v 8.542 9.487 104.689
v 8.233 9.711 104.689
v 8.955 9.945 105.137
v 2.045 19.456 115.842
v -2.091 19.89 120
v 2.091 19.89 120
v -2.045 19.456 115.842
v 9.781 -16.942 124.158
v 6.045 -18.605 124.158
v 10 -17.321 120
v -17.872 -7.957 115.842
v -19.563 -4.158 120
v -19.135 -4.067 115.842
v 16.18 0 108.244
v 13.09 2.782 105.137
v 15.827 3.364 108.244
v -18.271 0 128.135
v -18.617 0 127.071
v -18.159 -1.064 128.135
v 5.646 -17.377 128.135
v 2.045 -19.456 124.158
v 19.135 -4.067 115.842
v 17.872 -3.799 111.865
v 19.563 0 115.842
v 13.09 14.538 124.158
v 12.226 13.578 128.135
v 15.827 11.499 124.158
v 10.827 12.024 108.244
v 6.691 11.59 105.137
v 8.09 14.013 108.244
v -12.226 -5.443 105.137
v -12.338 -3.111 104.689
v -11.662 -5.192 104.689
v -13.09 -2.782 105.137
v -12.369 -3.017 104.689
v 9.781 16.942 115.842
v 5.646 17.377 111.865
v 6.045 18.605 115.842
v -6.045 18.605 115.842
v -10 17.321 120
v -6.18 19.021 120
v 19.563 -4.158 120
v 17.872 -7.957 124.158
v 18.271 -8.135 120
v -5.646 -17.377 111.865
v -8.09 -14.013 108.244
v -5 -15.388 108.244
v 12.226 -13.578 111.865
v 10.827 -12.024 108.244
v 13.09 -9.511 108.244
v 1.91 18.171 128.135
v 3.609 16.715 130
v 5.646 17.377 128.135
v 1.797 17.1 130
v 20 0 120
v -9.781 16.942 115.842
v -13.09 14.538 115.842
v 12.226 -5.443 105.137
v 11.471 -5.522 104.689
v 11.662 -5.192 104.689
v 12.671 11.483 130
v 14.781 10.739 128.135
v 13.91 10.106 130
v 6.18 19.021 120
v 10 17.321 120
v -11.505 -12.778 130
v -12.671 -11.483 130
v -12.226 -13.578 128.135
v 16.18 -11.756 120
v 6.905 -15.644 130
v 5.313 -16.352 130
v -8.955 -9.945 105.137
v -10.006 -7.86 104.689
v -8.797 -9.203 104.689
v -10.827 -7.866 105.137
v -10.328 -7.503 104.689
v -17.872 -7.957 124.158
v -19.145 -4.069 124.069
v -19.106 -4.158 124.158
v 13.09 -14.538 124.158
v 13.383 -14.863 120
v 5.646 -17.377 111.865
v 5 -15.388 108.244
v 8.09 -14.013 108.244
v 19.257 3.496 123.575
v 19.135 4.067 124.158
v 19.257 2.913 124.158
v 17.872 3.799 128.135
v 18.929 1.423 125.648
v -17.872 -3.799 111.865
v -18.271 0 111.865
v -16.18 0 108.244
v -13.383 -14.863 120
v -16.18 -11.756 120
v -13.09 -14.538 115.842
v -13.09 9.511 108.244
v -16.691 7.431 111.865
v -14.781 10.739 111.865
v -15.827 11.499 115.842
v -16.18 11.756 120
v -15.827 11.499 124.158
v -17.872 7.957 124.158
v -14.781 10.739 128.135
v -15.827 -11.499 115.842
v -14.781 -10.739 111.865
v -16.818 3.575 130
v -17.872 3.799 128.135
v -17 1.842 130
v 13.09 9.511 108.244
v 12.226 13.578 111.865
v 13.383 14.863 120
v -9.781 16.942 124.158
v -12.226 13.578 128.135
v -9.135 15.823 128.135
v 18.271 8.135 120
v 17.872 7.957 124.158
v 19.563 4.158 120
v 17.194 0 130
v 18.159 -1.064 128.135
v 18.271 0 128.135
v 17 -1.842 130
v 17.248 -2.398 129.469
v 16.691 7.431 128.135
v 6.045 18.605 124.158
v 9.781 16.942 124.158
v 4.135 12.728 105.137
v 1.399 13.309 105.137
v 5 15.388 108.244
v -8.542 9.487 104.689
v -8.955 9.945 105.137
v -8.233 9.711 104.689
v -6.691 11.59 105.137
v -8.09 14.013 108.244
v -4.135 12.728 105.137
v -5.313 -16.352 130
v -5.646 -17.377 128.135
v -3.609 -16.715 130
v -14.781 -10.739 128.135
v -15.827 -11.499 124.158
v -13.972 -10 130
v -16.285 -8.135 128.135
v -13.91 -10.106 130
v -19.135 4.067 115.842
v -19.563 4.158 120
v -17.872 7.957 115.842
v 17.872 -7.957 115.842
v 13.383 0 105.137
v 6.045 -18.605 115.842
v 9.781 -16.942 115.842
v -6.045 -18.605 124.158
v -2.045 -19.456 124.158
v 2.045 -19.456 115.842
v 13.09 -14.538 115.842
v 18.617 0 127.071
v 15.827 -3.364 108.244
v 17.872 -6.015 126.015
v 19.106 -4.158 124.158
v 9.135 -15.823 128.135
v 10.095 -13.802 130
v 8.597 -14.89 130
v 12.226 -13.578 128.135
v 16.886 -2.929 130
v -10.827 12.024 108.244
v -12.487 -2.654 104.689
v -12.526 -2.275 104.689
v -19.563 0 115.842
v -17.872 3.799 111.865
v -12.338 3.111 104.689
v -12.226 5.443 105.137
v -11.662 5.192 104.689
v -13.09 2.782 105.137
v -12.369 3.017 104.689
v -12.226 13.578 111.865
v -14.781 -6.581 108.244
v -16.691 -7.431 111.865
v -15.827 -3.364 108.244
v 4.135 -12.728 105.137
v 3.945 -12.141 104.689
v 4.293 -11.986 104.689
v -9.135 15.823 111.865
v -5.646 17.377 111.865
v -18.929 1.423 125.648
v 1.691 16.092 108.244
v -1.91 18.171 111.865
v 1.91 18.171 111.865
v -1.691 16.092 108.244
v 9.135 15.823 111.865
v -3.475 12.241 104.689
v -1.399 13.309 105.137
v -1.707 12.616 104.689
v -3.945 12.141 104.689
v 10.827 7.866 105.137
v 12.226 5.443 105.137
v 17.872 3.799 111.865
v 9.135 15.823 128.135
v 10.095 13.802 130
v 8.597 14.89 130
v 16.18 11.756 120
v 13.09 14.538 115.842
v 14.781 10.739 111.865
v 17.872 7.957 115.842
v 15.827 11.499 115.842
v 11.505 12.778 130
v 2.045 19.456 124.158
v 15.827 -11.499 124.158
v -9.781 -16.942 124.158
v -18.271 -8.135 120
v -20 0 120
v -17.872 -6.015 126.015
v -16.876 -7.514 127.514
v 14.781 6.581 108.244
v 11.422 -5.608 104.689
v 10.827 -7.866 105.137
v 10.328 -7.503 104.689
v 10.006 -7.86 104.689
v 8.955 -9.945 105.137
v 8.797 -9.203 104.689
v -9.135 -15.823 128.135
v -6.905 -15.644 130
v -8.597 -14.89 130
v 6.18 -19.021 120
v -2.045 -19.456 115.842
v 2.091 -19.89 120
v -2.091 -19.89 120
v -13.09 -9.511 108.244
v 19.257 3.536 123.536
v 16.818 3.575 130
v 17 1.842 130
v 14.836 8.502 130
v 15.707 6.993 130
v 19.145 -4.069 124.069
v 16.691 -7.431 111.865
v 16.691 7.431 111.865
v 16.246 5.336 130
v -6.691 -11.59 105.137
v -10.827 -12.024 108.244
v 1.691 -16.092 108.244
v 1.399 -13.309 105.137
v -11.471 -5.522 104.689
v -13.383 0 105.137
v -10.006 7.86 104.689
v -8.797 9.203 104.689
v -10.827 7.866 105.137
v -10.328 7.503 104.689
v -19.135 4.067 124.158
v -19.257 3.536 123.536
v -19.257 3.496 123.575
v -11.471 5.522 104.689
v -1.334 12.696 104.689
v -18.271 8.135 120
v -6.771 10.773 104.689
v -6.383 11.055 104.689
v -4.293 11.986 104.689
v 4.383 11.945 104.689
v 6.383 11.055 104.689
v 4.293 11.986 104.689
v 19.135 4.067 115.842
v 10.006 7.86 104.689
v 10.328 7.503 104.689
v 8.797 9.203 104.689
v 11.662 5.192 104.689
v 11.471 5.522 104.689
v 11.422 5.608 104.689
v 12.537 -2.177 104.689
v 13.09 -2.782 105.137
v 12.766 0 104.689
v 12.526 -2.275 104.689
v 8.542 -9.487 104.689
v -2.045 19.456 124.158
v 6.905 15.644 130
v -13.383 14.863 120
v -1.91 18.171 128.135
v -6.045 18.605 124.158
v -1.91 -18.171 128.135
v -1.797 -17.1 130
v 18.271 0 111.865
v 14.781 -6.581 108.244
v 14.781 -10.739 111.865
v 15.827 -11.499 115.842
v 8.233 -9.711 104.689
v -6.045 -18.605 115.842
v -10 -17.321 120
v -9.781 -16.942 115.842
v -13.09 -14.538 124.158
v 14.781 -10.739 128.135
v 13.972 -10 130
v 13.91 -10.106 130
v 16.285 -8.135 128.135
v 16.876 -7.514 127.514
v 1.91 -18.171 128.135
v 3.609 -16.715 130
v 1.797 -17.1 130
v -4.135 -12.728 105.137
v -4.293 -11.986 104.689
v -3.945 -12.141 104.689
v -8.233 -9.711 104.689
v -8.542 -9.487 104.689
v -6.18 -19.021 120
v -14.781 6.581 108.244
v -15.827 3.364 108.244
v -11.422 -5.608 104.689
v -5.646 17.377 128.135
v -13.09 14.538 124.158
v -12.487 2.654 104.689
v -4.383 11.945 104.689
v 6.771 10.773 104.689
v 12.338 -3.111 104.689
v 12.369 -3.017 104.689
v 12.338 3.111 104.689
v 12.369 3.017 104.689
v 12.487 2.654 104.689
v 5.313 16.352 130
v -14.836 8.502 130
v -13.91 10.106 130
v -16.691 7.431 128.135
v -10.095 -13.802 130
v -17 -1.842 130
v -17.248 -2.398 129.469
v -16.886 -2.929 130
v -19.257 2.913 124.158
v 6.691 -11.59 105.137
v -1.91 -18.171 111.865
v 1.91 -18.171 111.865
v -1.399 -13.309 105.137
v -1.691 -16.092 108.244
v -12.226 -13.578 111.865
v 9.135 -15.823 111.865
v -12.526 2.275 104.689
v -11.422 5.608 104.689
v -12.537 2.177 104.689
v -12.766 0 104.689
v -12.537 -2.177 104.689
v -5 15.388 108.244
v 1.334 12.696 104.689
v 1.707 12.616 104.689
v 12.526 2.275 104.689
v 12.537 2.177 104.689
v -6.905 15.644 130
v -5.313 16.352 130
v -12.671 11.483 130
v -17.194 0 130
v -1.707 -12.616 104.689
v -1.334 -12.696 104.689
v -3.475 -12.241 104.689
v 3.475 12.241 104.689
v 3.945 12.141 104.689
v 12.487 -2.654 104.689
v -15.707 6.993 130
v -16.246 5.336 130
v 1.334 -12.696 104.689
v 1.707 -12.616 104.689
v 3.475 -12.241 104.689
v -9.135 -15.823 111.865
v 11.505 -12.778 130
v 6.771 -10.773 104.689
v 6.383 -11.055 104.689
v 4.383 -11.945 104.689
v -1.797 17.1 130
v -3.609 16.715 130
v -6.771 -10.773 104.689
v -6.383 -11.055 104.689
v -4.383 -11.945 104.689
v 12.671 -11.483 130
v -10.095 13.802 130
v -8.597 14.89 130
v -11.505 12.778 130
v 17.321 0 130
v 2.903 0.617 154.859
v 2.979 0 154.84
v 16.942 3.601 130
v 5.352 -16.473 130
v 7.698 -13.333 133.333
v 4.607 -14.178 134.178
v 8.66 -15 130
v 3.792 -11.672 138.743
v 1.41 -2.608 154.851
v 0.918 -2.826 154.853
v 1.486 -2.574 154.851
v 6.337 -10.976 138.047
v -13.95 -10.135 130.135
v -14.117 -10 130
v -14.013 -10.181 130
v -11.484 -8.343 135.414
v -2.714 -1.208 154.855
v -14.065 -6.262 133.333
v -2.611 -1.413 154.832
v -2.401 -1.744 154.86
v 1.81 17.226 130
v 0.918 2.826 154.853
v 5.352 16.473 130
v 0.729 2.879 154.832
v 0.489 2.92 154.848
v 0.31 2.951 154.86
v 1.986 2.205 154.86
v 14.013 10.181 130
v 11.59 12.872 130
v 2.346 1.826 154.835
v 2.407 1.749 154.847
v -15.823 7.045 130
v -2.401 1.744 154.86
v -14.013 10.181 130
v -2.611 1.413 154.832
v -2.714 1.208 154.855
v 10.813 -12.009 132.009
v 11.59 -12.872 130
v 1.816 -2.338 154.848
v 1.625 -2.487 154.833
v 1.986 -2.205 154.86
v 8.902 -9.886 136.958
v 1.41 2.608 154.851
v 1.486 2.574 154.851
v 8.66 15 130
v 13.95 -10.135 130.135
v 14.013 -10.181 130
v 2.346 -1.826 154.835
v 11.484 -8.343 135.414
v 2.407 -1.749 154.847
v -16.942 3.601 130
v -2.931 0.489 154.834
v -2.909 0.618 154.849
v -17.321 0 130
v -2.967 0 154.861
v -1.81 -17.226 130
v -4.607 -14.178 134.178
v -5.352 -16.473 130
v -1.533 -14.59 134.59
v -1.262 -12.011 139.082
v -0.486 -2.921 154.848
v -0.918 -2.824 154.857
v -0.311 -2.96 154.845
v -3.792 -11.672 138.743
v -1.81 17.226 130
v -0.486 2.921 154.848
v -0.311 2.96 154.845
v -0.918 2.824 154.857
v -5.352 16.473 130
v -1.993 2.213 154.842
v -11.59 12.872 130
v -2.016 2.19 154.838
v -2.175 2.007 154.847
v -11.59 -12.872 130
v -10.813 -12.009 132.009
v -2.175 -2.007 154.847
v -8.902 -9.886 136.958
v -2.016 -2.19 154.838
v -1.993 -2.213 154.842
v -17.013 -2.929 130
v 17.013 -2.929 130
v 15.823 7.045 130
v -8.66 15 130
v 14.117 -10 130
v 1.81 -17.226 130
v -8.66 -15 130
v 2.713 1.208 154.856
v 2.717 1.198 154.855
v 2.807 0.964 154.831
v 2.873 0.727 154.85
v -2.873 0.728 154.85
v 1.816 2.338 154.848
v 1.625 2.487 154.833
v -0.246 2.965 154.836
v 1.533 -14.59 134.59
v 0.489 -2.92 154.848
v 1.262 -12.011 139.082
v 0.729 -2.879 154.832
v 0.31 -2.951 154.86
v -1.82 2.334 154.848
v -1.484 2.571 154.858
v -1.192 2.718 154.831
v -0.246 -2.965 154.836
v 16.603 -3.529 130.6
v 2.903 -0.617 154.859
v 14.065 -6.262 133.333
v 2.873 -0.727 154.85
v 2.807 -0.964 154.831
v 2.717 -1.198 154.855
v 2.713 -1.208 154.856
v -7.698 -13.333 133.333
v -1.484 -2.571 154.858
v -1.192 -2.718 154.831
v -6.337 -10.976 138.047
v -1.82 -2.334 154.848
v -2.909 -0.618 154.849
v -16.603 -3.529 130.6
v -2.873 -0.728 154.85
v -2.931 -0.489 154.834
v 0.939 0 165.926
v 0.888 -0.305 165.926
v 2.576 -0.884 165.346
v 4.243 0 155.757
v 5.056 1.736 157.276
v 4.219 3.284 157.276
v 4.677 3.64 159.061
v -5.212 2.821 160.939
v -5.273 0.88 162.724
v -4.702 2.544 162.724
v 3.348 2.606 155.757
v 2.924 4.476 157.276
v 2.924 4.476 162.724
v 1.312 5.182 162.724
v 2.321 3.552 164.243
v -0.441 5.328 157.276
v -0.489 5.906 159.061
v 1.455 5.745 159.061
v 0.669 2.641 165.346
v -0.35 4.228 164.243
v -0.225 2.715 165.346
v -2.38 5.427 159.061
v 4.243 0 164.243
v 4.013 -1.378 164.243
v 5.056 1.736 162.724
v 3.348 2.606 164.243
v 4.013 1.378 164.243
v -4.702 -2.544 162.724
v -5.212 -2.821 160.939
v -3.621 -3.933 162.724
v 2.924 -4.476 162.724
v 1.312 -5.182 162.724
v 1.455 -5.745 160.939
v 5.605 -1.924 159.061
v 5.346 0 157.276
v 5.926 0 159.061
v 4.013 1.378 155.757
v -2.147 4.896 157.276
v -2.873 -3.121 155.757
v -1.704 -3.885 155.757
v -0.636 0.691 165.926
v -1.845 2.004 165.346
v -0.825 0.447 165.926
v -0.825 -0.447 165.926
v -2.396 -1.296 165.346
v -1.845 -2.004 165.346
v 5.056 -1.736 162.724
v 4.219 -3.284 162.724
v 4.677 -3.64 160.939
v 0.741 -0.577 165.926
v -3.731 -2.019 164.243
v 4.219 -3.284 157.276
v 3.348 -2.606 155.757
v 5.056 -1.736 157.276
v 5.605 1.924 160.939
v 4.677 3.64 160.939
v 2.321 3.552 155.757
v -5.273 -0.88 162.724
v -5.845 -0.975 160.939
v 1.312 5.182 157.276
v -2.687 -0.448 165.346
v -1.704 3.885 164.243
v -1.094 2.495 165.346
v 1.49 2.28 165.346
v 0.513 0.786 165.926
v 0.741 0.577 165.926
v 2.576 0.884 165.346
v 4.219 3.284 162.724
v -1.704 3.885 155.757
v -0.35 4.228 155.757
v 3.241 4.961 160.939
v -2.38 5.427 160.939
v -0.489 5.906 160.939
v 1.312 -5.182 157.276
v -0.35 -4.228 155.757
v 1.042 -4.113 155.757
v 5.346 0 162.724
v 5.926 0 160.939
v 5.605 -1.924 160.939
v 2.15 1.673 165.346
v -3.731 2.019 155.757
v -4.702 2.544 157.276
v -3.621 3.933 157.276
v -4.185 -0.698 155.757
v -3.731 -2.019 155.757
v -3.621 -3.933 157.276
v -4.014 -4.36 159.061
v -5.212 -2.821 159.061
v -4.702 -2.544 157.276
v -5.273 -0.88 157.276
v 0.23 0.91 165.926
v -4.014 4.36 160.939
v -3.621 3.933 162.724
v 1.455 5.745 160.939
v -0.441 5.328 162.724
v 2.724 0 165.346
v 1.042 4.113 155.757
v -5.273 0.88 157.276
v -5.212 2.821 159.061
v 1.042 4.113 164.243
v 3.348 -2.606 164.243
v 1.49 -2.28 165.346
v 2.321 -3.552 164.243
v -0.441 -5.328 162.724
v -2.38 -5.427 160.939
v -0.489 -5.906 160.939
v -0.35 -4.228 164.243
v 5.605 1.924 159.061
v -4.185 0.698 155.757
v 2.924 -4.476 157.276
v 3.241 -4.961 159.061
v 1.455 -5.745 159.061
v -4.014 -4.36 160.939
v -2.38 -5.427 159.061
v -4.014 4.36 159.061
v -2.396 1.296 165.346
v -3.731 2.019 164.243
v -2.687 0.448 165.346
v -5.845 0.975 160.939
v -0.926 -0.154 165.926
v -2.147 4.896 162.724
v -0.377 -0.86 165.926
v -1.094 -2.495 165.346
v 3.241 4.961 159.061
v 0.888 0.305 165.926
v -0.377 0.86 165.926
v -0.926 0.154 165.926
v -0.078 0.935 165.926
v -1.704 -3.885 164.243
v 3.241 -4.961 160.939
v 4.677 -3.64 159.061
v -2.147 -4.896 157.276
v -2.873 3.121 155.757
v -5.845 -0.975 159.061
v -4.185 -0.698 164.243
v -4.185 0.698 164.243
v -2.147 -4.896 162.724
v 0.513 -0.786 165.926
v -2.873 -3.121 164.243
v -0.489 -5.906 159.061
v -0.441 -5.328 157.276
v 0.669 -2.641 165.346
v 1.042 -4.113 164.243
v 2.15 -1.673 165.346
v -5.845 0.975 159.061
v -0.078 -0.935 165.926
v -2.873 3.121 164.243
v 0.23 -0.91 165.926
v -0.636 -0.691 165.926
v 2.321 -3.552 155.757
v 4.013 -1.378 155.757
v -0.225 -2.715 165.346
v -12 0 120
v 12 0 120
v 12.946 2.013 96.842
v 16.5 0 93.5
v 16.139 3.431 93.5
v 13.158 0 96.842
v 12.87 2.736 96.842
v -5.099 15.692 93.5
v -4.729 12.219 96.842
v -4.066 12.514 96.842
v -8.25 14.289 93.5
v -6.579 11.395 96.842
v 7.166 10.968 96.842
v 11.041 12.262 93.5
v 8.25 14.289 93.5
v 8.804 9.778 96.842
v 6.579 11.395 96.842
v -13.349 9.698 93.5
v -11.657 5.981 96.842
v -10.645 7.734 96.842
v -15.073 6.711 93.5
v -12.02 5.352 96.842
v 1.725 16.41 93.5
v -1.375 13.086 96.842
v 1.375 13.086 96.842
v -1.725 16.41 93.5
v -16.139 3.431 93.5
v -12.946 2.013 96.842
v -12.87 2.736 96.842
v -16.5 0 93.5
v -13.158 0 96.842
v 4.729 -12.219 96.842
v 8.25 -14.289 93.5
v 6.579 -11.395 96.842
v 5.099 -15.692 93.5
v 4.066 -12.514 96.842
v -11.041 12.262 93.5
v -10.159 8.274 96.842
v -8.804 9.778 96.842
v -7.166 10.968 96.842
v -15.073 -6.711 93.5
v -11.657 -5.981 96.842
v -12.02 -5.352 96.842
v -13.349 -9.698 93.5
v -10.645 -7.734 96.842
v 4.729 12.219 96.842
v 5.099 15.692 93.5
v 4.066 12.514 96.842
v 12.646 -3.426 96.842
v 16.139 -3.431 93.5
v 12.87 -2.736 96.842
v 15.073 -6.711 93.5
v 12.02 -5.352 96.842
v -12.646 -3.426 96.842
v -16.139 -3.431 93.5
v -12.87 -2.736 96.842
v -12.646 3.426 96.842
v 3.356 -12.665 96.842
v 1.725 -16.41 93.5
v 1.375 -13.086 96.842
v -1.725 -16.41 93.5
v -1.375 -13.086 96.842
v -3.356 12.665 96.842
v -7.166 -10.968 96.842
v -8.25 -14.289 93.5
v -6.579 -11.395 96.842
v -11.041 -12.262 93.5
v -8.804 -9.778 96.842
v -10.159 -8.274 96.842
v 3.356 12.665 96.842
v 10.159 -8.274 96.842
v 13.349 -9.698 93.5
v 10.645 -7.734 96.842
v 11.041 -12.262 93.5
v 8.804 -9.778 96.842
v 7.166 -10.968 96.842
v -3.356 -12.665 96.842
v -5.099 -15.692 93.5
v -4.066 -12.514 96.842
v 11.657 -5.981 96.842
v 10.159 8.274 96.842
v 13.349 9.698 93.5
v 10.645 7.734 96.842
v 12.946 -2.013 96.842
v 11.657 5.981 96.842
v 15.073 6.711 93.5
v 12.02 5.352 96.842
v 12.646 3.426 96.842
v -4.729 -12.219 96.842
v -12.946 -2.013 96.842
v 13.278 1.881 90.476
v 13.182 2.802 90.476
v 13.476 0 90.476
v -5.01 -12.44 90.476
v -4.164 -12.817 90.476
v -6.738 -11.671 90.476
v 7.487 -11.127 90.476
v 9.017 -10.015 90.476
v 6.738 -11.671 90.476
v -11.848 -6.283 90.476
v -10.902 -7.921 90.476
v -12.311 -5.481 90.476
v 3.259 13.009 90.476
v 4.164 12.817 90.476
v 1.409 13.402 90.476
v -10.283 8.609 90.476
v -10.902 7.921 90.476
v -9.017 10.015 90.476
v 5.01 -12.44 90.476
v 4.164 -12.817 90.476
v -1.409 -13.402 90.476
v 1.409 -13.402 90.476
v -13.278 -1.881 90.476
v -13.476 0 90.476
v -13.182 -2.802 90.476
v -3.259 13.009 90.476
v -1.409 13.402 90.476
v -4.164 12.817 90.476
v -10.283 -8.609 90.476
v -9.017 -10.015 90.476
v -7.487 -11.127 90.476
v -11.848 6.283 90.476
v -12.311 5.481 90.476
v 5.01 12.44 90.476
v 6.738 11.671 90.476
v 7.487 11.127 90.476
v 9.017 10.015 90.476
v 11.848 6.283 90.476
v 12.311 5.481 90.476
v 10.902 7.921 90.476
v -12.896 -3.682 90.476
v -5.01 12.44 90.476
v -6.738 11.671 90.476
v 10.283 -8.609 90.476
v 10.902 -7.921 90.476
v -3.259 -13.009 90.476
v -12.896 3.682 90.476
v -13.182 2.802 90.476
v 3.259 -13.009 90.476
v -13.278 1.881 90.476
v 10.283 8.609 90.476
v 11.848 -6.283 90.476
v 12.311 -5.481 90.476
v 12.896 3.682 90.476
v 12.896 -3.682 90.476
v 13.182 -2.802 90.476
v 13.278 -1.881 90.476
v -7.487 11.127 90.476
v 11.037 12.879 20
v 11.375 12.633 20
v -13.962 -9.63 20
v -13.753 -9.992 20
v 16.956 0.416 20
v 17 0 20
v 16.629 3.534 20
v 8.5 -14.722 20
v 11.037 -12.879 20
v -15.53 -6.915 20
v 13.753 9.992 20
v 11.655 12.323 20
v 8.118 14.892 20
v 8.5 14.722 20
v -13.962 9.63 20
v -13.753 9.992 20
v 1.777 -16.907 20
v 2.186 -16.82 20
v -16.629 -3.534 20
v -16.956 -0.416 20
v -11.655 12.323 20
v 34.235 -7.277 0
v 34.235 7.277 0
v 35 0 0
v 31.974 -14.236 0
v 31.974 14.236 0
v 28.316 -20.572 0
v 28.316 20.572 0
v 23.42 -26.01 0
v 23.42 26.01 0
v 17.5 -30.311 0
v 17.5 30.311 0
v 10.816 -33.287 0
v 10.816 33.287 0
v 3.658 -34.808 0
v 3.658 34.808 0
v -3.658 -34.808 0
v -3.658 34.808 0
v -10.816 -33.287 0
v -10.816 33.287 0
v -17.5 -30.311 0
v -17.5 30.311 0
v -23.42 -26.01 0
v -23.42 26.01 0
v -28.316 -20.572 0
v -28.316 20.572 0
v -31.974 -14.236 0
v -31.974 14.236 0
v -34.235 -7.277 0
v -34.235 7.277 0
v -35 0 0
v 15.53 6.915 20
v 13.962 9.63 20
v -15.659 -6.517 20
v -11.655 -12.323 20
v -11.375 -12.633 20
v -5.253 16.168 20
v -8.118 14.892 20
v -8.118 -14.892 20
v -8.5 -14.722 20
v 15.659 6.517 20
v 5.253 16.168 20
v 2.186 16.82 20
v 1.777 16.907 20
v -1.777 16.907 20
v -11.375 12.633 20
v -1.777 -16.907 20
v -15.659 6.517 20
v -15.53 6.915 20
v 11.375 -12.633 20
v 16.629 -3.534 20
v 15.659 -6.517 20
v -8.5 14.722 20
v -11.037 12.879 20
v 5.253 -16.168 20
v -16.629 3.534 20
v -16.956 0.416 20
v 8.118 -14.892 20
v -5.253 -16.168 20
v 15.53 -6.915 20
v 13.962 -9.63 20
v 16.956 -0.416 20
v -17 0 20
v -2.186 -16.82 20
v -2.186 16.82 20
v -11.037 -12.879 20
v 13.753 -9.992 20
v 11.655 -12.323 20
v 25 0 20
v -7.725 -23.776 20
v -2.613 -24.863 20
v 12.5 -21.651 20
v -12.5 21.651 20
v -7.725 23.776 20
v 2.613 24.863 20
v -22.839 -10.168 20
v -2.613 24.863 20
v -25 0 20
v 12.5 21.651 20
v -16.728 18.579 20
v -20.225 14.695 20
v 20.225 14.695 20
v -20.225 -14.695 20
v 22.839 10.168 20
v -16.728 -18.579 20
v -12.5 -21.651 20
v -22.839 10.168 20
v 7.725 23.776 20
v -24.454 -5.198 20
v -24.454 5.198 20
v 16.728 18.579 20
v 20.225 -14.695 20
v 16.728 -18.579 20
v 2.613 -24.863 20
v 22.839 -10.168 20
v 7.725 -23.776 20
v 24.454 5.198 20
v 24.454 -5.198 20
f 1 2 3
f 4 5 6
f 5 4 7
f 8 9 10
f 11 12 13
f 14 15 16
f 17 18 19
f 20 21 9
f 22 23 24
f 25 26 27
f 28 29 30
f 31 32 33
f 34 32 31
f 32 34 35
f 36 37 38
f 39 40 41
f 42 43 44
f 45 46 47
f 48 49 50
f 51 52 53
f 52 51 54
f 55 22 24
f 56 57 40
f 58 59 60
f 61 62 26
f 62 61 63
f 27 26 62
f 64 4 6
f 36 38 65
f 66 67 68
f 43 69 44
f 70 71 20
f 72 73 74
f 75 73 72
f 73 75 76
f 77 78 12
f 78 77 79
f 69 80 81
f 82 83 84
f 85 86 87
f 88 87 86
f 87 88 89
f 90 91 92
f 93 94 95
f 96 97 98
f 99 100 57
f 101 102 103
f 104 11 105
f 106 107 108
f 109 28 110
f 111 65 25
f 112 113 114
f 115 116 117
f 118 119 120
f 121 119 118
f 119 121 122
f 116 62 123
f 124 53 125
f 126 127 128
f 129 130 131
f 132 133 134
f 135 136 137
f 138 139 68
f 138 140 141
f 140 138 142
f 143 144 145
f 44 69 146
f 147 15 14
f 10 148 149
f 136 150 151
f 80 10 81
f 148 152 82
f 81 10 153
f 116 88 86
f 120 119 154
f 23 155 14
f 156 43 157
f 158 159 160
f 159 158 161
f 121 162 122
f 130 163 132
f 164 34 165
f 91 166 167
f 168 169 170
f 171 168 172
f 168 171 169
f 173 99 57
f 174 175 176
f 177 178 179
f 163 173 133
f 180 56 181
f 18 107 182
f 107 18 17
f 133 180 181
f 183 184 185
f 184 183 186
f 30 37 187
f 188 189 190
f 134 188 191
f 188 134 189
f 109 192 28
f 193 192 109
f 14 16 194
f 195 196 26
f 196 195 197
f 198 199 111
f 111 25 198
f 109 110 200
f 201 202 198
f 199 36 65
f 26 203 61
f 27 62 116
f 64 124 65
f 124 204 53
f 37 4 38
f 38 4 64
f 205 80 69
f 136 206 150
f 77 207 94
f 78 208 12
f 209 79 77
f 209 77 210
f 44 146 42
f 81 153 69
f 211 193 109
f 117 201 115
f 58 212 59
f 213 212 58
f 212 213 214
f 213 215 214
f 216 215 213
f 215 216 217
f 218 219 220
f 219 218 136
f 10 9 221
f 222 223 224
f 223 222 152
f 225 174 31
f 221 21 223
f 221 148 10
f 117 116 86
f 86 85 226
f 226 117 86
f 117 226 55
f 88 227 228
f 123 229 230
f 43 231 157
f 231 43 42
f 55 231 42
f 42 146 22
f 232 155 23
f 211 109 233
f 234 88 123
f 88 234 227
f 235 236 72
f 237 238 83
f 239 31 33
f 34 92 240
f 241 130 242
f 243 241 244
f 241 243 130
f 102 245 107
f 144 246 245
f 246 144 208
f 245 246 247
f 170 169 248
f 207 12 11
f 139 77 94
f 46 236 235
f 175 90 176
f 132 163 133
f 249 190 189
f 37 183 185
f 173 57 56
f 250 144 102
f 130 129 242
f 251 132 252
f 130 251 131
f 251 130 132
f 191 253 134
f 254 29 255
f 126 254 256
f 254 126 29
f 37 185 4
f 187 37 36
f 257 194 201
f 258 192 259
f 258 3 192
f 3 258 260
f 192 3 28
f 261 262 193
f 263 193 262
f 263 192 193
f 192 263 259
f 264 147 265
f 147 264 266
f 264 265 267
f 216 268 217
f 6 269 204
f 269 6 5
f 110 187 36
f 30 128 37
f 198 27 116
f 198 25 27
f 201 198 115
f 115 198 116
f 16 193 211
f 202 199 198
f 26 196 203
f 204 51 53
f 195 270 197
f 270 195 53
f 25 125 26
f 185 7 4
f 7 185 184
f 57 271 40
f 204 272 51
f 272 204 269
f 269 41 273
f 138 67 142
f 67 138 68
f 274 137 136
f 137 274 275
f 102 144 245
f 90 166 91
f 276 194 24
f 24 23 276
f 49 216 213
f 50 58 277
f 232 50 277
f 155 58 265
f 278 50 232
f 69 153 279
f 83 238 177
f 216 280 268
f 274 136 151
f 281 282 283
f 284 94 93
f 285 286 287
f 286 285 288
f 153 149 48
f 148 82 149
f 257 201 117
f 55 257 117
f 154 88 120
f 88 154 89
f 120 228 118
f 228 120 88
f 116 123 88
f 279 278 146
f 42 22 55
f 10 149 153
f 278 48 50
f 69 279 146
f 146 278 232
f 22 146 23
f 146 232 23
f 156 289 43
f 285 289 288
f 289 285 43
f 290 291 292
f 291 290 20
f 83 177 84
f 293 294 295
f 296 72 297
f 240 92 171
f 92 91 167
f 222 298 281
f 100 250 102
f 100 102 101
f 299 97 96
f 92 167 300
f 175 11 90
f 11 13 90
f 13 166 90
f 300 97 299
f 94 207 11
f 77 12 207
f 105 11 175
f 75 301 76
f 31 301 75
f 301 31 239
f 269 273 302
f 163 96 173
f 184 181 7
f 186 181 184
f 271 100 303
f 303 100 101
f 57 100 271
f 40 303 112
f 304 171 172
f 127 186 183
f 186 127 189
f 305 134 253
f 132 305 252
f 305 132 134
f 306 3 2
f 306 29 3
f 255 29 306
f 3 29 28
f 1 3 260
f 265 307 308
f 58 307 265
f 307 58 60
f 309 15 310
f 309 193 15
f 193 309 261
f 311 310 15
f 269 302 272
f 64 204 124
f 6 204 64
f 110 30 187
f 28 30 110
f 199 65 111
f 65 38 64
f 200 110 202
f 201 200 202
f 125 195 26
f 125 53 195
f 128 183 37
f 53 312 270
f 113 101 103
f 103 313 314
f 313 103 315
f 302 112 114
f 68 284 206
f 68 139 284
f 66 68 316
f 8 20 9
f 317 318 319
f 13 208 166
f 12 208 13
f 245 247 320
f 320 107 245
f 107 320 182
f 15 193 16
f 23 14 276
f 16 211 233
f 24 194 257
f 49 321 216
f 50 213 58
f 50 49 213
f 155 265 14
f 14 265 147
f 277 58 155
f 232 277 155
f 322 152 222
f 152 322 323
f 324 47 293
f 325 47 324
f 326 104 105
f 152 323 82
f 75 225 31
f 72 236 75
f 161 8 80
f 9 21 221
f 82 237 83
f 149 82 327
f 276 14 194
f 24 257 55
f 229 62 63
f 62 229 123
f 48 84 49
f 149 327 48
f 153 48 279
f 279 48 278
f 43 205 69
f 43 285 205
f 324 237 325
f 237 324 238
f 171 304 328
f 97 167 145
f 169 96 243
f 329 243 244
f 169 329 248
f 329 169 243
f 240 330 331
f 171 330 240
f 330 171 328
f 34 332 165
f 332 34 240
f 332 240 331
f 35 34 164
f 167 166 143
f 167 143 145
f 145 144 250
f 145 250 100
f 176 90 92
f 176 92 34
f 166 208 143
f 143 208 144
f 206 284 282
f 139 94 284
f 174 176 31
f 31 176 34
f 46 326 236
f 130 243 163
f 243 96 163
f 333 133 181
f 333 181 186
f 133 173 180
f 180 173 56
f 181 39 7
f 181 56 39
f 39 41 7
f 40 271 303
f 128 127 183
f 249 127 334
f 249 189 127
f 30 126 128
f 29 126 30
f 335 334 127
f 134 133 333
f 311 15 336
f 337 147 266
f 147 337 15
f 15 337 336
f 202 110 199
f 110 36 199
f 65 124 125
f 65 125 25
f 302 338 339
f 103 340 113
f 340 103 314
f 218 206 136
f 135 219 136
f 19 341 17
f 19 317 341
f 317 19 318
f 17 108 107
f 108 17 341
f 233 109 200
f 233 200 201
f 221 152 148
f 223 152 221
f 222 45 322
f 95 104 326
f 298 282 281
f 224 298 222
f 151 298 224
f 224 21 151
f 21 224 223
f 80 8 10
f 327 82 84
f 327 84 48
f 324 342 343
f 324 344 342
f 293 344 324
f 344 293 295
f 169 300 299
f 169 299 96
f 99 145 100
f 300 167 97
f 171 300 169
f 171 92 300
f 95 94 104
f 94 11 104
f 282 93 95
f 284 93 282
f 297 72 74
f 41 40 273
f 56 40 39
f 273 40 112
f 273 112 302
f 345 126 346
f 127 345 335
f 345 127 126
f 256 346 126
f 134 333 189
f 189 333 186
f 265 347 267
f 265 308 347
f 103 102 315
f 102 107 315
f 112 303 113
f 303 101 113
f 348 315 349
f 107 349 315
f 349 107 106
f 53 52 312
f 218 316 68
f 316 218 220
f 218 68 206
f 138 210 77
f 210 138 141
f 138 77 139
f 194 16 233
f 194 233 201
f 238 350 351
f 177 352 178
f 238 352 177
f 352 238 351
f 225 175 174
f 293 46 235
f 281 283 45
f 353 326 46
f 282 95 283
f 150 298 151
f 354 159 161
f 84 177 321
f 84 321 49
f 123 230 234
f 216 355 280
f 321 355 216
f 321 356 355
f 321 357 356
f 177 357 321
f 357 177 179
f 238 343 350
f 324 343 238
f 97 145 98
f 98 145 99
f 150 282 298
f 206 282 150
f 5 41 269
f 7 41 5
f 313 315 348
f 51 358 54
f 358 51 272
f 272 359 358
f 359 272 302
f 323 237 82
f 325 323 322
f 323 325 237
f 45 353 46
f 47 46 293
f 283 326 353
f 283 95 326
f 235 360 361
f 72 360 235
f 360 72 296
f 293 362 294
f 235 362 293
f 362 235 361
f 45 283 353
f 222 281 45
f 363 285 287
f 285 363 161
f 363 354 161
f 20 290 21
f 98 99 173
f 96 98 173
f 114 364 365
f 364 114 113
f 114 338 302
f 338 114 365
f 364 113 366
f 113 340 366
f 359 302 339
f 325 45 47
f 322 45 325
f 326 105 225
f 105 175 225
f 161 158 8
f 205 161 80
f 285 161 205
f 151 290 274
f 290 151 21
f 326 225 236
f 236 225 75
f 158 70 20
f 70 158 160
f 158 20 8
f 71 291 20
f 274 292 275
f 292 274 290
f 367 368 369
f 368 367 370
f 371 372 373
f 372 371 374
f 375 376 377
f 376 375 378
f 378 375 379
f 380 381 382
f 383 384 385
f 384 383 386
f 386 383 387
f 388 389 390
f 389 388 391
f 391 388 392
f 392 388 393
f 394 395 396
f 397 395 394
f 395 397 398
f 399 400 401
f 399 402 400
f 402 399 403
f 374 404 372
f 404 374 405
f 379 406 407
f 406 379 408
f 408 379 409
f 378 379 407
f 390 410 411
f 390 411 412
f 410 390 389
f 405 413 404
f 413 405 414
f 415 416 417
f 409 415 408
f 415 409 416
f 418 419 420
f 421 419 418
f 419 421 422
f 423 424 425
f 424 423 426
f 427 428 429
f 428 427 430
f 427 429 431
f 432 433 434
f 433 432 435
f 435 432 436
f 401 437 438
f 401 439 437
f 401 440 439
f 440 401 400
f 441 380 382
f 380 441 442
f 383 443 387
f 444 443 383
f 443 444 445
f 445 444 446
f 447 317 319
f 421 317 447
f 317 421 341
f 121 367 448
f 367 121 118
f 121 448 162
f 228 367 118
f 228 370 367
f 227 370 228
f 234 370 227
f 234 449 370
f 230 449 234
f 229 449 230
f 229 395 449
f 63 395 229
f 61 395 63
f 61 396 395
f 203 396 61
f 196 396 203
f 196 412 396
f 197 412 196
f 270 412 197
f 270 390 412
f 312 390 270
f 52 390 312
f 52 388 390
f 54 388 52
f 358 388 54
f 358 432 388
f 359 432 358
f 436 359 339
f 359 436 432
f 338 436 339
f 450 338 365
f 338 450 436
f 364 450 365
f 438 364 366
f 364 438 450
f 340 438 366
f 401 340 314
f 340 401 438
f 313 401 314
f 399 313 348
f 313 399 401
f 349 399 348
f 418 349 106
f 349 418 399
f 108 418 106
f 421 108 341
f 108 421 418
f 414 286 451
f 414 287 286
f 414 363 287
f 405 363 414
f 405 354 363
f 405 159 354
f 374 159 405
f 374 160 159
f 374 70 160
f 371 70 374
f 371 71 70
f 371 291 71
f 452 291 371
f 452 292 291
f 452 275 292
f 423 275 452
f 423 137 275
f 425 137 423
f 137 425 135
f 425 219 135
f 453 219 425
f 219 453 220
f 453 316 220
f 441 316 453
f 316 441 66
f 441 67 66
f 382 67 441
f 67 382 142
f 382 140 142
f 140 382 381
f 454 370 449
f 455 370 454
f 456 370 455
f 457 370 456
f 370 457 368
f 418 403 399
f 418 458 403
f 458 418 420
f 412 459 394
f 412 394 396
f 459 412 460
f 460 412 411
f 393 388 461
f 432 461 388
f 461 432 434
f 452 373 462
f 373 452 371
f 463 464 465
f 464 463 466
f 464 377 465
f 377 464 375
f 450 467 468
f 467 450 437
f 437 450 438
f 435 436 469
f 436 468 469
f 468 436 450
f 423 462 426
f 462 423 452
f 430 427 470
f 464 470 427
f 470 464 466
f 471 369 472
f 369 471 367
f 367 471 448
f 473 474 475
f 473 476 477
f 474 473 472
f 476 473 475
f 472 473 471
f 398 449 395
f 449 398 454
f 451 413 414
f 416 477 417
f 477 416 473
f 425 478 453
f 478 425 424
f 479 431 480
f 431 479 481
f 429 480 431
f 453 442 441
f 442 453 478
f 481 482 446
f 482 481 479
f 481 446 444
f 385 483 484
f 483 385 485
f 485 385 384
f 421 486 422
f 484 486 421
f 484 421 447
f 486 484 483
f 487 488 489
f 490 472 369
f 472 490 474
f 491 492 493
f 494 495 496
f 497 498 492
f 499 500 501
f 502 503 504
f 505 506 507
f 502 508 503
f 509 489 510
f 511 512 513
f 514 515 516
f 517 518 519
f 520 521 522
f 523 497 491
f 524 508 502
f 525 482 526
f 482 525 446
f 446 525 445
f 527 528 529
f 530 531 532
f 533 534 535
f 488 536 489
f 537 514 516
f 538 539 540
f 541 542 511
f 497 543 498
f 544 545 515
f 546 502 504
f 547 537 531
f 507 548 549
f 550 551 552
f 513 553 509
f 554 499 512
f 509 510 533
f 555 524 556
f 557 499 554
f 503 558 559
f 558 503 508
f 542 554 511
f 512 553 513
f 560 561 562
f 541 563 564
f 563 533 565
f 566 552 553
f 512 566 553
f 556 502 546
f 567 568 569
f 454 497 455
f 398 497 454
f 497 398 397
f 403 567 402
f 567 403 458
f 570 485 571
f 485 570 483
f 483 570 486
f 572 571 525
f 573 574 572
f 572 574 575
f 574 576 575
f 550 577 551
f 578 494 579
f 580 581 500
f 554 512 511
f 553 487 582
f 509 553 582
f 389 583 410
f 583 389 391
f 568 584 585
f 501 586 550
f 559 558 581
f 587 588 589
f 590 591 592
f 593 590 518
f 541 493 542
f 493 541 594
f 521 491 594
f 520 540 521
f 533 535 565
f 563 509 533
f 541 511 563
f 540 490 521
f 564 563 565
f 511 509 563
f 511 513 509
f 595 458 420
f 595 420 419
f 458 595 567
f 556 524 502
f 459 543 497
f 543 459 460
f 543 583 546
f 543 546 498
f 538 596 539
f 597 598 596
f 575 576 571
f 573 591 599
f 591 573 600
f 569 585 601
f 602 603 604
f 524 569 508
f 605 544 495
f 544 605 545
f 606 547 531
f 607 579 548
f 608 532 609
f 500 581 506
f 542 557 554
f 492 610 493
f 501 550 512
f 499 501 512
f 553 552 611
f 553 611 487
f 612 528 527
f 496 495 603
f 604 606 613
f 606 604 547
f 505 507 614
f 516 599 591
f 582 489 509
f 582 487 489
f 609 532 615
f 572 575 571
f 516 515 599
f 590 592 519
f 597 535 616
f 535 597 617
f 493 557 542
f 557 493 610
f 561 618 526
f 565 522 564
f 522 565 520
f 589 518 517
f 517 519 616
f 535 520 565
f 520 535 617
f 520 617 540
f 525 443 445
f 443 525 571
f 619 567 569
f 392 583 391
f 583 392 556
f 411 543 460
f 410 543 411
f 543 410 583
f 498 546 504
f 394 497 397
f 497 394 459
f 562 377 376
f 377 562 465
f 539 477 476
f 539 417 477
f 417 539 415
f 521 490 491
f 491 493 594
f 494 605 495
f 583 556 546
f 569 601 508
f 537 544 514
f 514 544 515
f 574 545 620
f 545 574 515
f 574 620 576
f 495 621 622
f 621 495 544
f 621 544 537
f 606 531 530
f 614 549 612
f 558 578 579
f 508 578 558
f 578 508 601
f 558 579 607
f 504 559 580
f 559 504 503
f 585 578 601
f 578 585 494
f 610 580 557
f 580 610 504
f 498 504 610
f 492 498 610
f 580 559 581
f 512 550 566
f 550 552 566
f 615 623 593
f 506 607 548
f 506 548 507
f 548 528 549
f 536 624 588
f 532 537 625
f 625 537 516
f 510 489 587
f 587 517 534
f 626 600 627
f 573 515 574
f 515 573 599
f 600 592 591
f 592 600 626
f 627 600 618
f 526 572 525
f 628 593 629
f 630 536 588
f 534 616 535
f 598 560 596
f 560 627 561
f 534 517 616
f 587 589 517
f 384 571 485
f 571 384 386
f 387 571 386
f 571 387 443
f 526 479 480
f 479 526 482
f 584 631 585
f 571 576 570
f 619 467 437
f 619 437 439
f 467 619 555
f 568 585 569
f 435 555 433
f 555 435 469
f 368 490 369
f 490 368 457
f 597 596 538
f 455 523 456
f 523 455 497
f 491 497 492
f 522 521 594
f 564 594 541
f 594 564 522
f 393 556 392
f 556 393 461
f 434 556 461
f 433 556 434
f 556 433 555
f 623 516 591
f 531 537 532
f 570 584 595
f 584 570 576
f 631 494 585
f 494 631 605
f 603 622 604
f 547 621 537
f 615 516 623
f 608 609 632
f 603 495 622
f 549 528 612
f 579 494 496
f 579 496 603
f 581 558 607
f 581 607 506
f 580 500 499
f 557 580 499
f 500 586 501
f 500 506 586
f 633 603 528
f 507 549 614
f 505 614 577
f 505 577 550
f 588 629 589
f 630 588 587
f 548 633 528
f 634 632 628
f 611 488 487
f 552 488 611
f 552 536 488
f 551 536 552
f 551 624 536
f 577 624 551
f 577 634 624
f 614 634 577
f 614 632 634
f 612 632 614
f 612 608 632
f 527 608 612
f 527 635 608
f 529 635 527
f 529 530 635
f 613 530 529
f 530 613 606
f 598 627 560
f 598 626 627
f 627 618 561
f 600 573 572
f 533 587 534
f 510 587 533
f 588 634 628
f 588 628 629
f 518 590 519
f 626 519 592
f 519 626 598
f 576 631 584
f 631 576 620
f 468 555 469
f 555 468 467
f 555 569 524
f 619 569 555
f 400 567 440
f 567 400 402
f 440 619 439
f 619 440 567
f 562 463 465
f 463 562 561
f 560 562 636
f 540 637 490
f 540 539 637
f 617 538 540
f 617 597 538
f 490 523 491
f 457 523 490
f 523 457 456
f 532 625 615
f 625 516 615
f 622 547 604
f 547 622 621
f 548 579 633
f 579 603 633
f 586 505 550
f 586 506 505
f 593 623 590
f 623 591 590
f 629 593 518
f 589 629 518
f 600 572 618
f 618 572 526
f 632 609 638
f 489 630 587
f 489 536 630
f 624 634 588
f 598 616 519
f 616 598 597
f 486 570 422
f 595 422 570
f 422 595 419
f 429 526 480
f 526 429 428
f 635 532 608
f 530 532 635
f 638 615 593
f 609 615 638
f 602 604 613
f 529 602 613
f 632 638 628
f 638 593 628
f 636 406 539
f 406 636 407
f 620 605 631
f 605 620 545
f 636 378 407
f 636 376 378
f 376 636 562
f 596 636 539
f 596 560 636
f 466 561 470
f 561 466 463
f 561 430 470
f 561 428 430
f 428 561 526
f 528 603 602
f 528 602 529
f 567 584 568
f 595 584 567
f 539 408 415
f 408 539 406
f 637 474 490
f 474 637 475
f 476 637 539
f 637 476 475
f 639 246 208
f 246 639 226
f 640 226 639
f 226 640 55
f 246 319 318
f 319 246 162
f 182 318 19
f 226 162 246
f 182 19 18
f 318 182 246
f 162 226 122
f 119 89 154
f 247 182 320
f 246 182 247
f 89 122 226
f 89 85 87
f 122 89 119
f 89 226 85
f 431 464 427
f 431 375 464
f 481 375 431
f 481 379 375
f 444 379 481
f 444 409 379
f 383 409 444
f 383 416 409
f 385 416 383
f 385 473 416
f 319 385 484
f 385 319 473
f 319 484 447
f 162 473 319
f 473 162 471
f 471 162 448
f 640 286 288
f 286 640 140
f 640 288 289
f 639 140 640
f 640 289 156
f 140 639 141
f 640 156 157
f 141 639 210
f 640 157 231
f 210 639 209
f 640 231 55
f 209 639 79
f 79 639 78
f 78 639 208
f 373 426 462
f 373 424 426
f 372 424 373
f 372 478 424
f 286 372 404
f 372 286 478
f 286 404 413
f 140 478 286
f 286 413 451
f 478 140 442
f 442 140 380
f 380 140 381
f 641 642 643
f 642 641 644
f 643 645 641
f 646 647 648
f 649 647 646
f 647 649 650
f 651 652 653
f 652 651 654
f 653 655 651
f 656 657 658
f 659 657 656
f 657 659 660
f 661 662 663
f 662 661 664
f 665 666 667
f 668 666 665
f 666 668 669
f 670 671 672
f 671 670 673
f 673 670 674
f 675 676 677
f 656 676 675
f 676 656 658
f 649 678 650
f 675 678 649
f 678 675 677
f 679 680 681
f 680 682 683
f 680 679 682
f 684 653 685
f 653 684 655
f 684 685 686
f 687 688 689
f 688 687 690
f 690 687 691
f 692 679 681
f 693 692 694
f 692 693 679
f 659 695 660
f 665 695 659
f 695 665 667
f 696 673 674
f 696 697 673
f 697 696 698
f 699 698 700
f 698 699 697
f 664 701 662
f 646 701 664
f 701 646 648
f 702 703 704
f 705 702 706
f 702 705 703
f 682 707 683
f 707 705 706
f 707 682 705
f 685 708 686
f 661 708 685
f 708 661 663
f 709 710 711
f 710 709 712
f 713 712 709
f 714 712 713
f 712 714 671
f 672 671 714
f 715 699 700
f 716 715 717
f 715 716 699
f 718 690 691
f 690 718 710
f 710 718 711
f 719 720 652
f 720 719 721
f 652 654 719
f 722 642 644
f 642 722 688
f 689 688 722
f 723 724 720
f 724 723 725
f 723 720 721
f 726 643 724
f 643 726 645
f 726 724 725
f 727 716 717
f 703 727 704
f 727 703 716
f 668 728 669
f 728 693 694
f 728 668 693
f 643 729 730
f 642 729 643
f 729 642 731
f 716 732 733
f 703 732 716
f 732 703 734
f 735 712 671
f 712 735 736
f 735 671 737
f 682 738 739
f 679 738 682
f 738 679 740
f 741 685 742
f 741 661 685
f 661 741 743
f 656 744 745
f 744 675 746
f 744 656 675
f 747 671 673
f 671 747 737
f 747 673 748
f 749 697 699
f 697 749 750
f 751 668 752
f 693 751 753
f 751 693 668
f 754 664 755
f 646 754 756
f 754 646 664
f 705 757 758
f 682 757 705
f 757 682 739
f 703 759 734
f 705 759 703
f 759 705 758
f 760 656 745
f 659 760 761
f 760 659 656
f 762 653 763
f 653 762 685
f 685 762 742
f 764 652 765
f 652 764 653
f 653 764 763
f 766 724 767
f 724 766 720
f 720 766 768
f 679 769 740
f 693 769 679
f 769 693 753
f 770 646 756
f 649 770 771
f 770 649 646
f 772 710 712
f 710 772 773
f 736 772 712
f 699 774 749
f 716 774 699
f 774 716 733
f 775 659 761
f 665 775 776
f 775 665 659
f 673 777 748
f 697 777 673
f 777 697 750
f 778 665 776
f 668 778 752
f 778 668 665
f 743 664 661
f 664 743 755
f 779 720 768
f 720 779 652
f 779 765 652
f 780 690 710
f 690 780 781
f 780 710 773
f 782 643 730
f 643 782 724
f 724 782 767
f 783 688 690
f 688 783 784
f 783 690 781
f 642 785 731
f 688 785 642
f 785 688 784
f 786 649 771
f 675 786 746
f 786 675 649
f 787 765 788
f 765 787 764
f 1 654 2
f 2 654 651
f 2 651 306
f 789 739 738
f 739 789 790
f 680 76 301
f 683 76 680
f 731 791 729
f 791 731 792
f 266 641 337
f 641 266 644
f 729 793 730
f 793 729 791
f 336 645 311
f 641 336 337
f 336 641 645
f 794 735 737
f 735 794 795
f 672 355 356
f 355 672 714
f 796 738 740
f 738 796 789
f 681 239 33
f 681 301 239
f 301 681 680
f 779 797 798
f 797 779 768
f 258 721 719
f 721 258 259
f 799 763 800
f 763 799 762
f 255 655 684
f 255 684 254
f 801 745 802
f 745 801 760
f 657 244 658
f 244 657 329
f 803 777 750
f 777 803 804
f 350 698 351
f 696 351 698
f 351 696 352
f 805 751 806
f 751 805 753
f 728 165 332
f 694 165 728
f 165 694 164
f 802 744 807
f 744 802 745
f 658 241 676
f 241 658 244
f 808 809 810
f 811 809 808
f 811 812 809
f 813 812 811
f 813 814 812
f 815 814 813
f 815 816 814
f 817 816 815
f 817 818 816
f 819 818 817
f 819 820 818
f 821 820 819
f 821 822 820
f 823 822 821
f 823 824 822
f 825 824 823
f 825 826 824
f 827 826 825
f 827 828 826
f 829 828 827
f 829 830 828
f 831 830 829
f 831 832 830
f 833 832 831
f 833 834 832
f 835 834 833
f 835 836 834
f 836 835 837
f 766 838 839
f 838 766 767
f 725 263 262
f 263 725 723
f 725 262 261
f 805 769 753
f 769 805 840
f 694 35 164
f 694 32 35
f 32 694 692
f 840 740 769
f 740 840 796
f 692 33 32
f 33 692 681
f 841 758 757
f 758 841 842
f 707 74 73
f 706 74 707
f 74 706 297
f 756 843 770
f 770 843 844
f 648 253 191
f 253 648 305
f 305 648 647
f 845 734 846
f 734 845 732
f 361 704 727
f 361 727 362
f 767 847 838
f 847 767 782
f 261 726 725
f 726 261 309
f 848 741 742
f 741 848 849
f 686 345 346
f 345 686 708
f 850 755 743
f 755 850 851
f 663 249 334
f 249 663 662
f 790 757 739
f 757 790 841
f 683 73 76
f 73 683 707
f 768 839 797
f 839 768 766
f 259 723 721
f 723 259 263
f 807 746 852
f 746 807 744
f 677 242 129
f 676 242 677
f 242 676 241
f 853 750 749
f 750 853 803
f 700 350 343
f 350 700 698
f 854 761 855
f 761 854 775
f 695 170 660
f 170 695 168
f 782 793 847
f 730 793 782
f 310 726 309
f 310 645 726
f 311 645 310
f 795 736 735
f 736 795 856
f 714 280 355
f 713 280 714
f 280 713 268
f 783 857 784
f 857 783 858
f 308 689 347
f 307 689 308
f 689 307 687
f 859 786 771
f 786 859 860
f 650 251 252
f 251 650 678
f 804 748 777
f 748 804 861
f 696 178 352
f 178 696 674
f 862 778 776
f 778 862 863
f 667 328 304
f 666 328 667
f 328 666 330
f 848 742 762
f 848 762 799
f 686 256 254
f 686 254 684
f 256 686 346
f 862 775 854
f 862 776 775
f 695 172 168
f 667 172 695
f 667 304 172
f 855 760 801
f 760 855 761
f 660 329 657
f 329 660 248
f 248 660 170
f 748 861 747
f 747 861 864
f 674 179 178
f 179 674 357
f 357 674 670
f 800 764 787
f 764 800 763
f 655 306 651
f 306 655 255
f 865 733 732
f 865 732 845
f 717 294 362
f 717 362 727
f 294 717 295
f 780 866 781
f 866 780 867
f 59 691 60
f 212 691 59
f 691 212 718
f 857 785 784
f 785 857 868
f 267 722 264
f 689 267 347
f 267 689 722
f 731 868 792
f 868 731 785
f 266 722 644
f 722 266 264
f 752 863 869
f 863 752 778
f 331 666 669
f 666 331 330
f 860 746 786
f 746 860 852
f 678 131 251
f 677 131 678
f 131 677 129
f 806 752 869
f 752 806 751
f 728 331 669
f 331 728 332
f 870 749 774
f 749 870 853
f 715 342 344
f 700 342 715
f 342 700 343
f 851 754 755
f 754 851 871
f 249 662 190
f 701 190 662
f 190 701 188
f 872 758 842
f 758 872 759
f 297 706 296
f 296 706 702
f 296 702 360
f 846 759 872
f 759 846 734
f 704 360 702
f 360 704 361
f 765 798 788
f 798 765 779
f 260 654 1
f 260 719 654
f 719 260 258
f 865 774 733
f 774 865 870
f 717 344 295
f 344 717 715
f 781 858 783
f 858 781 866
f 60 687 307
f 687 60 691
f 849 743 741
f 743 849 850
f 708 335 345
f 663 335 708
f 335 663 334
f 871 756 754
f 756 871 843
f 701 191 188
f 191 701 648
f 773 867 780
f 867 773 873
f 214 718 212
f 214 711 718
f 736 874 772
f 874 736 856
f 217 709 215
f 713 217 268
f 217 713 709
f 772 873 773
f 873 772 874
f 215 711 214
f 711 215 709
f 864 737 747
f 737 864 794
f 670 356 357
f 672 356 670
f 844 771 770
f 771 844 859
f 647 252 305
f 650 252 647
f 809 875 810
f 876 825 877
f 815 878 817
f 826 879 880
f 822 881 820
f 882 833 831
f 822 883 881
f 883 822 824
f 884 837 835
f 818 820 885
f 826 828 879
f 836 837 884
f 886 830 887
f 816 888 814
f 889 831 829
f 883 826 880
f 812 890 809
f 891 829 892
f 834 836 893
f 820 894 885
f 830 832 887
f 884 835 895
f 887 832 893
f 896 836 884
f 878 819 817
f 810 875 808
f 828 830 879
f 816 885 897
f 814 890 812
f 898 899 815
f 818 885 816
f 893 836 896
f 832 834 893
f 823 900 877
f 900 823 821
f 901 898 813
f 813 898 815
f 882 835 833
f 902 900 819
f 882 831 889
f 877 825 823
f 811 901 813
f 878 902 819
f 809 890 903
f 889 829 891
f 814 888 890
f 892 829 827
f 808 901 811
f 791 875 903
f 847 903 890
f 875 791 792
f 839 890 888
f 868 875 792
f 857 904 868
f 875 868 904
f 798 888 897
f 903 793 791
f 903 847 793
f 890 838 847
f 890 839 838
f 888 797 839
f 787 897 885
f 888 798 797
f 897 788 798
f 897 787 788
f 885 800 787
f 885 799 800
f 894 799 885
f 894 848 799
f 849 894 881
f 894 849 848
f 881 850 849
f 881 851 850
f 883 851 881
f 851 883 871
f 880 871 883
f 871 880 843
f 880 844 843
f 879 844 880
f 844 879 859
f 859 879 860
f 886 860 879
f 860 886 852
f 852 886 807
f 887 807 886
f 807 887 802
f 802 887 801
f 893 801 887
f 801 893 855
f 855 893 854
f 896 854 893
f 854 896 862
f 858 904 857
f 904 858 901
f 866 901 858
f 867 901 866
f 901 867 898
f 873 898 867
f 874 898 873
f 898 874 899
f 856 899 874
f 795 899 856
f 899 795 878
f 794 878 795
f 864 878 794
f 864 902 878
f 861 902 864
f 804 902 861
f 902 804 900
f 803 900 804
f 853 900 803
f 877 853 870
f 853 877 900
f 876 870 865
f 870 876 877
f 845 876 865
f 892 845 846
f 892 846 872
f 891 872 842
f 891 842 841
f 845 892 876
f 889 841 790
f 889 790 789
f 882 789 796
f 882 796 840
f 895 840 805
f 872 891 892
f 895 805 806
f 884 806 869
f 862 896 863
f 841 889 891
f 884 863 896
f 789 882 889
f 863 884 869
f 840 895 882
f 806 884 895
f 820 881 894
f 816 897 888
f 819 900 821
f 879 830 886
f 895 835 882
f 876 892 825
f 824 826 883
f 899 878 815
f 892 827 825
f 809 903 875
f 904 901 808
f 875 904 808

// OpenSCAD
union() {
  // head
  translate([0, 0, 120])
    difference() {
      union() {
        // teardrop shape
        sphere(r = 20);
        translate([0, 0, 20 * sin(30)])
          cylinder(h = 30, r1 = 20 * cos(30), r2 = 0);

        // dollop
        translate([0, 0, 30 + 20 * sin(30)])
          sphere(r = 6);
      }
      //cut out slot
      rotate([45, 0, 0])
        translate([-20, 0, 0])
          cube([40, 5, 40]);
    }
  // neck
  cylinder(h = 120, r1 = 18, r2 = 12);

  // base
  cylinder(h = 20, r1 = 35, r2 = 25);

  // collar
  translate([0, 0, 90])
    intersection() {
      cylinder(h = 20, r1 = 20, r2 = 0);
      translate([0, 0, 7])
        mirror([0, 0, 1])
          cylinder(h = 20, r1 = 20, r2 = 0);
    }
}
